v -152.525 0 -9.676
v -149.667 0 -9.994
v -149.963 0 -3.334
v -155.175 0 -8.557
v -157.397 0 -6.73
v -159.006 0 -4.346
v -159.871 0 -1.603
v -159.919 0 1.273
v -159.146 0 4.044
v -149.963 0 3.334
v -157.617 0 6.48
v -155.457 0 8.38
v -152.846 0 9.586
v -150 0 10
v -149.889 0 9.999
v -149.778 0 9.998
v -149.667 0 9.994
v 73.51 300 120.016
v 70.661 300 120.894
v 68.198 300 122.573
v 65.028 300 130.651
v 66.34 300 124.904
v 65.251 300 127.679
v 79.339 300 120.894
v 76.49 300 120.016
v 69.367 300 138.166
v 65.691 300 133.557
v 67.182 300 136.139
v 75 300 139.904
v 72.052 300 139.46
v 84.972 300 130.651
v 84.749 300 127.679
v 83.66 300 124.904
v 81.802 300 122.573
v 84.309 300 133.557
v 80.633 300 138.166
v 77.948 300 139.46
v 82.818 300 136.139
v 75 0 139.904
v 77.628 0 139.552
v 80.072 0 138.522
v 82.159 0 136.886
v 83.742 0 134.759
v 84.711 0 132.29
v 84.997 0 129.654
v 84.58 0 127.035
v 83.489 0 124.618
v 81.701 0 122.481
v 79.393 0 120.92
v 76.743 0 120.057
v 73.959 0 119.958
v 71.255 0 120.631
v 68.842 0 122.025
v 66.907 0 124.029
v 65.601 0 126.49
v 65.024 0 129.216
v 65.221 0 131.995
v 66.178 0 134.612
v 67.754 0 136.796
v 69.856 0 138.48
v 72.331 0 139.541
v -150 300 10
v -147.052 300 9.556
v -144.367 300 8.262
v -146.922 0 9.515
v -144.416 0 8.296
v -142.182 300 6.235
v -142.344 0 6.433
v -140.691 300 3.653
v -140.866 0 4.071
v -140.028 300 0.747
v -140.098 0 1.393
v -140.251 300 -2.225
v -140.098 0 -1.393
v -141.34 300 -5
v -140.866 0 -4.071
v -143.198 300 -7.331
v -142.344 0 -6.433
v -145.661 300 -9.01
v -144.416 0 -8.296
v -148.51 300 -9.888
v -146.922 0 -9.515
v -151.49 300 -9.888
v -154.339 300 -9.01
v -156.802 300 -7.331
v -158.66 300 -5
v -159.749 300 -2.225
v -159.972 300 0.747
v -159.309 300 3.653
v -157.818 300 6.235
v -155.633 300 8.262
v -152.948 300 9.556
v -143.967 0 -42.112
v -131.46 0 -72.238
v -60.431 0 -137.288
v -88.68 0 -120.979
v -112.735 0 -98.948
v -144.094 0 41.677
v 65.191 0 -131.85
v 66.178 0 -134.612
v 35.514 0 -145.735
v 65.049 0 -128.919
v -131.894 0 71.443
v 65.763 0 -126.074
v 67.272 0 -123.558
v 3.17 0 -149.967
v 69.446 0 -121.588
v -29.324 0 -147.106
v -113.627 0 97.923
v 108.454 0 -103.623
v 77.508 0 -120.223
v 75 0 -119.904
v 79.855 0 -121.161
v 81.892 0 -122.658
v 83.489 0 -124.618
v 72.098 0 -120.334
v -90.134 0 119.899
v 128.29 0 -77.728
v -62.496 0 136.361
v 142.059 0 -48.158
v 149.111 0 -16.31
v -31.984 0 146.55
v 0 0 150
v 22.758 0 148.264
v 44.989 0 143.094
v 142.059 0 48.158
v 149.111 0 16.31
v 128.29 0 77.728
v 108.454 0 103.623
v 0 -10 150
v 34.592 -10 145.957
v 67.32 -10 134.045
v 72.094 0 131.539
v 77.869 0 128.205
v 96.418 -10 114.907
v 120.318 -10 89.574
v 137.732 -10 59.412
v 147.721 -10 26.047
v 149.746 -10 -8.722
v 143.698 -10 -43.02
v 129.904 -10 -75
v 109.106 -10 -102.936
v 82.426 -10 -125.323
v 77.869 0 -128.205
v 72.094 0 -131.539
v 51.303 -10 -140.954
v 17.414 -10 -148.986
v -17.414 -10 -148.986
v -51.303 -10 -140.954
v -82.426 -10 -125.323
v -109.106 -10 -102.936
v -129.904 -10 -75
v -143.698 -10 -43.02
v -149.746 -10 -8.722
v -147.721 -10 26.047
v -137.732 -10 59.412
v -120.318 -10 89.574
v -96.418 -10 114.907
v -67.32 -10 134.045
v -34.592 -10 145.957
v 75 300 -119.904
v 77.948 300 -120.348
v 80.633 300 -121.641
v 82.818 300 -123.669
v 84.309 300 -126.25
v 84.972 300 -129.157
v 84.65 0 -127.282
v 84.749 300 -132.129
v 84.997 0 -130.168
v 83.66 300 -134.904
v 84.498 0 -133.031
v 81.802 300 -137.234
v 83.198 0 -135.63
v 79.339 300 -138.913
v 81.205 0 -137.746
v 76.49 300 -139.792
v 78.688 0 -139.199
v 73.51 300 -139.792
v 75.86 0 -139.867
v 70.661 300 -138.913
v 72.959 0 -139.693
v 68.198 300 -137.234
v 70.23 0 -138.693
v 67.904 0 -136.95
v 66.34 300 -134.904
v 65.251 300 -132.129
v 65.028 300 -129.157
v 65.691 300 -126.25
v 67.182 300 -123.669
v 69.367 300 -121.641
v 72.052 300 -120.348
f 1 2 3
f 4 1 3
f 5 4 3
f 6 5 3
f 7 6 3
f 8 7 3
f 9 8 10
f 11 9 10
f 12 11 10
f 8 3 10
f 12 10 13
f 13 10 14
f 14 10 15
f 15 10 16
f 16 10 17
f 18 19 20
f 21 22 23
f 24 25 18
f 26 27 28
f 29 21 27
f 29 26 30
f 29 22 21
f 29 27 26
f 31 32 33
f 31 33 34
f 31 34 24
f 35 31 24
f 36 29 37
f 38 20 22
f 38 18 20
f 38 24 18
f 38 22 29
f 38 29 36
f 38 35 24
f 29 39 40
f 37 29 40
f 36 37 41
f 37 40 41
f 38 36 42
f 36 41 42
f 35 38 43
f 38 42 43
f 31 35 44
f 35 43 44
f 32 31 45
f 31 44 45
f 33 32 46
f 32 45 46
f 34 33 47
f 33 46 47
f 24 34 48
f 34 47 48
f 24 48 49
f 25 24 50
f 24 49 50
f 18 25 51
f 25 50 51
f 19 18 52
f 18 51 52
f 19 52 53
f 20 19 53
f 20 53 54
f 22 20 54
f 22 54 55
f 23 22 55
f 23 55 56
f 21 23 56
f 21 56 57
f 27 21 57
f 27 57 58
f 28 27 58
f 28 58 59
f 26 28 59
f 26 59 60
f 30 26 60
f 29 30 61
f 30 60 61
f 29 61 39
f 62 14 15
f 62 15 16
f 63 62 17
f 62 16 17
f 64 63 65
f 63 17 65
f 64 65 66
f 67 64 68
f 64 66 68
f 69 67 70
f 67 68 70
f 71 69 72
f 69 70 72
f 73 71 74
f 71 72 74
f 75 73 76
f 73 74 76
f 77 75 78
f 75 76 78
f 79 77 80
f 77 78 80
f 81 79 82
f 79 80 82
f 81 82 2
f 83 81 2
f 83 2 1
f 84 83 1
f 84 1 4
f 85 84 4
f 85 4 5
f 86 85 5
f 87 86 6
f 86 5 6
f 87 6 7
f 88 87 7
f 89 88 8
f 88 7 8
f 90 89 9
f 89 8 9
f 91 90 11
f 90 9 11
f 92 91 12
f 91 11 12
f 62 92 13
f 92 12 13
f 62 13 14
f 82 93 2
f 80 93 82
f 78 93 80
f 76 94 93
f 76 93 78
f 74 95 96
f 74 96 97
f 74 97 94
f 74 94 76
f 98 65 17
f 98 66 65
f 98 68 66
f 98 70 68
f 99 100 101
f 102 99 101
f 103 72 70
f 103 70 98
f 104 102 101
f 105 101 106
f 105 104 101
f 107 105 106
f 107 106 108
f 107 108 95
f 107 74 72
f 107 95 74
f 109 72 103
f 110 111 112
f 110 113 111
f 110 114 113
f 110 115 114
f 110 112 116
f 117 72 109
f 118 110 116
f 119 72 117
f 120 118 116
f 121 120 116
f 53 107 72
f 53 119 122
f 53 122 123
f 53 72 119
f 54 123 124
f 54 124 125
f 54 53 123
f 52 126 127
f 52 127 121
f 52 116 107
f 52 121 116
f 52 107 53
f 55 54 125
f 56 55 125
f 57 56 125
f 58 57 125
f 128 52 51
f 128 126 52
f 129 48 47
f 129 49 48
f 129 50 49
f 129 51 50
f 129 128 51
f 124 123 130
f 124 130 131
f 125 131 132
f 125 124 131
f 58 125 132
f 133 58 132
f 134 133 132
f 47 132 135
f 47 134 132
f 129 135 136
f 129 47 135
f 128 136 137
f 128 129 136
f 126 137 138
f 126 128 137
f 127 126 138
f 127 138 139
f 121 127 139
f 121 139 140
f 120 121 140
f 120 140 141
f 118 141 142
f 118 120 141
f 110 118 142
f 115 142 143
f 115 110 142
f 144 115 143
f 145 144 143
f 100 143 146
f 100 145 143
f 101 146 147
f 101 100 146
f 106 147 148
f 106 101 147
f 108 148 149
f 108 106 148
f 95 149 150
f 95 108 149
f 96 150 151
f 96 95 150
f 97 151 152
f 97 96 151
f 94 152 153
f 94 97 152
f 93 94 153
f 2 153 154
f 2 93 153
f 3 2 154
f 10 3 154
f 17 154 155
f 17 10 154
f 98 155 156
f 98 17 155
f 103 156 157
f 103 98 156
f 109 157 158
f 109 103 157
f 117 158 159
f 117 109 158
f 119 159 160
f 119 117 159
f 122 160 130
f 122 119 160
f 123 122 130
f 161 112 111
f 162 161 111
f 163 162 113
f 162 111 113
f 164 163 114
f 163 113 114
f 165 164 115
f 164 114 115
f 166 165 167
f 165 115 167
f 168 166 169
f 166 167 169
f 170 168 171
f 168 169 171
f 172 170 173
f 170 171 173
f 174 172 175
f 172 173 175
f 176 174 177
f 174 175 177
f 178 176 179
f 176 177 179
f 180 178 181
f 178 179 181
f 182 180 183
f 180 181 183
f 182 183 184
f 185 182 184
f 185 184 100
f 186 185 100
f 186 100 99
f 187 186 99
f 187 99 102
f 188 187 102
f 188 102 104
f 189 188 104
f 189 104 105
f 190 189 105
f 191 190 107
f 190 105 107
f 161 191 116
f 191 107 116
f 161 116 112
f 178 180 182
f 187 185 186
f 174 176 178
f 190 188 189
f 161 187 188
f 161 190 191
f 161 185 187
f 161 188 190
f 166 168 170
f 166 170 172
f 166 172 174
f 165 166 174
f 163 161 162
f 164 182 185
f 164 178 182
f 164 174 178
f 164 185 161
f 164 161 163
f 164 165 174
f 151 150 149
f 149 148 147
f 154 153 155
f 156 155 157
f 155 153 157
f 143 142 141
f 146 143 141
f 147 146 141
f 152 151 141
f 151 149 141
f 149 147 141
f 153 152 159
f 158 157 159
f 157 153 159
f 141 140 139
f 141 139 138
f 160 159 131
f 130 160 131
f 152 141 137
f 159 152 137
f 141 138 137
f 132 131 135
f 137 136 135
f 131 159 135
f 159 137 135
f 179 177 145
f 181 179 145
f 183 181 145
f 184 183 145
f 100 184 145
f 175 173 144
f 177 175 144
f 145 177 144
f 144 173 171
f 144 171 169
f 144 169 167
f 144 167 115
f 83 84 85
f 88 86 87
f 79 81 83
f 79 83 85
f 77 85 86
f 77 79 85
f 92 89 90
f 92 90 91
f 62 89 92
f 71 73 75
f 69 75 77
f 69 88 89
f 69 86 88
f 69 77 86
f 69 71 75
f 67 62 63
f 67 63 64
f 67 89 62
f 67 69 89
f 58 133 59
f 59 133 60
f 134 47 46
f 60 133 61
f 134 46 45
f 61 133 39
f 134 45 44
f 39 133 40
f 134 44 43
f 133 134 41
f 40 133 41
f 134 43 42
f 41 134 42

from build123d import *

# Parameters (mm, degrees)
SKETCH1_R             = 10
BOSS_EXTRUDE1_DEPTH   = 300
BOSS_EXTRUDE1_2_DEPTH = 300
BOSS_EXTRUDE1_3_DEPTH = 300
SKETCH1_3_R           = 150
BOSS_EXTRUDE2_DEPTH   = 10


with BuildPart() as part:
    # Sketch1 → Boss-Extrude1 (new body)
    with BuildSketch(Plane(origin=(0, 0, 0), x_dir=(1, 0, 0), z_dir=(0, 1, 0))):
        with Locations((-150, 0)):
            Circle(SKETCH1_R)
    extrude(amount=BOSS_EXTRUDE1_DEPTH)



with BuildPart() as body_2:
    # Sketch1 → Boss-Extrude1 2 (new body)
    with BuildSketch(Plane(origin=(0, 0, 0), x_dir=(1, 0, 0), z_dir=(0, 1, 0))):
        with Locations((75, 129.903810568)):
            Circle(SKETCH1_R)
    extrude(amount=BOSS_EXTRUDE1_2_DEPTH)


with BuildPart() as body_3:
    # Sketch1 → Boss-Extrude1 3 (new body)
    with BuildSketch(Plane(origin=(0, 0, 0), x_dir=(1, 0, 0), z_dir=(0, 1, 0))):
        with Locations((75, -129.903810568)):
            Circle(SKETCH1_R)
    extrude(amount=BOSS_EXTRUDE1_3_DEPTH)


with BuildPart() as part_1:
    add(part.part)

    add(body_2.part)  # Boss-Extrude2 merges body 2

    add(body_3.part)  # Boss-Extrude2 merges body 3
    # Sketch1<3> → Boss-Extrude2 (add)
    with BuildSketch(Plane(origin=(0, 0, 0), x_dir=(1, 0, 0), z_dir=(0, 1, 0))):
        Circle(SKETCH1_3_R)
    extrude(amount=-BOSS_EXTRUDE2_DEPTH)


solid = part_1.part
